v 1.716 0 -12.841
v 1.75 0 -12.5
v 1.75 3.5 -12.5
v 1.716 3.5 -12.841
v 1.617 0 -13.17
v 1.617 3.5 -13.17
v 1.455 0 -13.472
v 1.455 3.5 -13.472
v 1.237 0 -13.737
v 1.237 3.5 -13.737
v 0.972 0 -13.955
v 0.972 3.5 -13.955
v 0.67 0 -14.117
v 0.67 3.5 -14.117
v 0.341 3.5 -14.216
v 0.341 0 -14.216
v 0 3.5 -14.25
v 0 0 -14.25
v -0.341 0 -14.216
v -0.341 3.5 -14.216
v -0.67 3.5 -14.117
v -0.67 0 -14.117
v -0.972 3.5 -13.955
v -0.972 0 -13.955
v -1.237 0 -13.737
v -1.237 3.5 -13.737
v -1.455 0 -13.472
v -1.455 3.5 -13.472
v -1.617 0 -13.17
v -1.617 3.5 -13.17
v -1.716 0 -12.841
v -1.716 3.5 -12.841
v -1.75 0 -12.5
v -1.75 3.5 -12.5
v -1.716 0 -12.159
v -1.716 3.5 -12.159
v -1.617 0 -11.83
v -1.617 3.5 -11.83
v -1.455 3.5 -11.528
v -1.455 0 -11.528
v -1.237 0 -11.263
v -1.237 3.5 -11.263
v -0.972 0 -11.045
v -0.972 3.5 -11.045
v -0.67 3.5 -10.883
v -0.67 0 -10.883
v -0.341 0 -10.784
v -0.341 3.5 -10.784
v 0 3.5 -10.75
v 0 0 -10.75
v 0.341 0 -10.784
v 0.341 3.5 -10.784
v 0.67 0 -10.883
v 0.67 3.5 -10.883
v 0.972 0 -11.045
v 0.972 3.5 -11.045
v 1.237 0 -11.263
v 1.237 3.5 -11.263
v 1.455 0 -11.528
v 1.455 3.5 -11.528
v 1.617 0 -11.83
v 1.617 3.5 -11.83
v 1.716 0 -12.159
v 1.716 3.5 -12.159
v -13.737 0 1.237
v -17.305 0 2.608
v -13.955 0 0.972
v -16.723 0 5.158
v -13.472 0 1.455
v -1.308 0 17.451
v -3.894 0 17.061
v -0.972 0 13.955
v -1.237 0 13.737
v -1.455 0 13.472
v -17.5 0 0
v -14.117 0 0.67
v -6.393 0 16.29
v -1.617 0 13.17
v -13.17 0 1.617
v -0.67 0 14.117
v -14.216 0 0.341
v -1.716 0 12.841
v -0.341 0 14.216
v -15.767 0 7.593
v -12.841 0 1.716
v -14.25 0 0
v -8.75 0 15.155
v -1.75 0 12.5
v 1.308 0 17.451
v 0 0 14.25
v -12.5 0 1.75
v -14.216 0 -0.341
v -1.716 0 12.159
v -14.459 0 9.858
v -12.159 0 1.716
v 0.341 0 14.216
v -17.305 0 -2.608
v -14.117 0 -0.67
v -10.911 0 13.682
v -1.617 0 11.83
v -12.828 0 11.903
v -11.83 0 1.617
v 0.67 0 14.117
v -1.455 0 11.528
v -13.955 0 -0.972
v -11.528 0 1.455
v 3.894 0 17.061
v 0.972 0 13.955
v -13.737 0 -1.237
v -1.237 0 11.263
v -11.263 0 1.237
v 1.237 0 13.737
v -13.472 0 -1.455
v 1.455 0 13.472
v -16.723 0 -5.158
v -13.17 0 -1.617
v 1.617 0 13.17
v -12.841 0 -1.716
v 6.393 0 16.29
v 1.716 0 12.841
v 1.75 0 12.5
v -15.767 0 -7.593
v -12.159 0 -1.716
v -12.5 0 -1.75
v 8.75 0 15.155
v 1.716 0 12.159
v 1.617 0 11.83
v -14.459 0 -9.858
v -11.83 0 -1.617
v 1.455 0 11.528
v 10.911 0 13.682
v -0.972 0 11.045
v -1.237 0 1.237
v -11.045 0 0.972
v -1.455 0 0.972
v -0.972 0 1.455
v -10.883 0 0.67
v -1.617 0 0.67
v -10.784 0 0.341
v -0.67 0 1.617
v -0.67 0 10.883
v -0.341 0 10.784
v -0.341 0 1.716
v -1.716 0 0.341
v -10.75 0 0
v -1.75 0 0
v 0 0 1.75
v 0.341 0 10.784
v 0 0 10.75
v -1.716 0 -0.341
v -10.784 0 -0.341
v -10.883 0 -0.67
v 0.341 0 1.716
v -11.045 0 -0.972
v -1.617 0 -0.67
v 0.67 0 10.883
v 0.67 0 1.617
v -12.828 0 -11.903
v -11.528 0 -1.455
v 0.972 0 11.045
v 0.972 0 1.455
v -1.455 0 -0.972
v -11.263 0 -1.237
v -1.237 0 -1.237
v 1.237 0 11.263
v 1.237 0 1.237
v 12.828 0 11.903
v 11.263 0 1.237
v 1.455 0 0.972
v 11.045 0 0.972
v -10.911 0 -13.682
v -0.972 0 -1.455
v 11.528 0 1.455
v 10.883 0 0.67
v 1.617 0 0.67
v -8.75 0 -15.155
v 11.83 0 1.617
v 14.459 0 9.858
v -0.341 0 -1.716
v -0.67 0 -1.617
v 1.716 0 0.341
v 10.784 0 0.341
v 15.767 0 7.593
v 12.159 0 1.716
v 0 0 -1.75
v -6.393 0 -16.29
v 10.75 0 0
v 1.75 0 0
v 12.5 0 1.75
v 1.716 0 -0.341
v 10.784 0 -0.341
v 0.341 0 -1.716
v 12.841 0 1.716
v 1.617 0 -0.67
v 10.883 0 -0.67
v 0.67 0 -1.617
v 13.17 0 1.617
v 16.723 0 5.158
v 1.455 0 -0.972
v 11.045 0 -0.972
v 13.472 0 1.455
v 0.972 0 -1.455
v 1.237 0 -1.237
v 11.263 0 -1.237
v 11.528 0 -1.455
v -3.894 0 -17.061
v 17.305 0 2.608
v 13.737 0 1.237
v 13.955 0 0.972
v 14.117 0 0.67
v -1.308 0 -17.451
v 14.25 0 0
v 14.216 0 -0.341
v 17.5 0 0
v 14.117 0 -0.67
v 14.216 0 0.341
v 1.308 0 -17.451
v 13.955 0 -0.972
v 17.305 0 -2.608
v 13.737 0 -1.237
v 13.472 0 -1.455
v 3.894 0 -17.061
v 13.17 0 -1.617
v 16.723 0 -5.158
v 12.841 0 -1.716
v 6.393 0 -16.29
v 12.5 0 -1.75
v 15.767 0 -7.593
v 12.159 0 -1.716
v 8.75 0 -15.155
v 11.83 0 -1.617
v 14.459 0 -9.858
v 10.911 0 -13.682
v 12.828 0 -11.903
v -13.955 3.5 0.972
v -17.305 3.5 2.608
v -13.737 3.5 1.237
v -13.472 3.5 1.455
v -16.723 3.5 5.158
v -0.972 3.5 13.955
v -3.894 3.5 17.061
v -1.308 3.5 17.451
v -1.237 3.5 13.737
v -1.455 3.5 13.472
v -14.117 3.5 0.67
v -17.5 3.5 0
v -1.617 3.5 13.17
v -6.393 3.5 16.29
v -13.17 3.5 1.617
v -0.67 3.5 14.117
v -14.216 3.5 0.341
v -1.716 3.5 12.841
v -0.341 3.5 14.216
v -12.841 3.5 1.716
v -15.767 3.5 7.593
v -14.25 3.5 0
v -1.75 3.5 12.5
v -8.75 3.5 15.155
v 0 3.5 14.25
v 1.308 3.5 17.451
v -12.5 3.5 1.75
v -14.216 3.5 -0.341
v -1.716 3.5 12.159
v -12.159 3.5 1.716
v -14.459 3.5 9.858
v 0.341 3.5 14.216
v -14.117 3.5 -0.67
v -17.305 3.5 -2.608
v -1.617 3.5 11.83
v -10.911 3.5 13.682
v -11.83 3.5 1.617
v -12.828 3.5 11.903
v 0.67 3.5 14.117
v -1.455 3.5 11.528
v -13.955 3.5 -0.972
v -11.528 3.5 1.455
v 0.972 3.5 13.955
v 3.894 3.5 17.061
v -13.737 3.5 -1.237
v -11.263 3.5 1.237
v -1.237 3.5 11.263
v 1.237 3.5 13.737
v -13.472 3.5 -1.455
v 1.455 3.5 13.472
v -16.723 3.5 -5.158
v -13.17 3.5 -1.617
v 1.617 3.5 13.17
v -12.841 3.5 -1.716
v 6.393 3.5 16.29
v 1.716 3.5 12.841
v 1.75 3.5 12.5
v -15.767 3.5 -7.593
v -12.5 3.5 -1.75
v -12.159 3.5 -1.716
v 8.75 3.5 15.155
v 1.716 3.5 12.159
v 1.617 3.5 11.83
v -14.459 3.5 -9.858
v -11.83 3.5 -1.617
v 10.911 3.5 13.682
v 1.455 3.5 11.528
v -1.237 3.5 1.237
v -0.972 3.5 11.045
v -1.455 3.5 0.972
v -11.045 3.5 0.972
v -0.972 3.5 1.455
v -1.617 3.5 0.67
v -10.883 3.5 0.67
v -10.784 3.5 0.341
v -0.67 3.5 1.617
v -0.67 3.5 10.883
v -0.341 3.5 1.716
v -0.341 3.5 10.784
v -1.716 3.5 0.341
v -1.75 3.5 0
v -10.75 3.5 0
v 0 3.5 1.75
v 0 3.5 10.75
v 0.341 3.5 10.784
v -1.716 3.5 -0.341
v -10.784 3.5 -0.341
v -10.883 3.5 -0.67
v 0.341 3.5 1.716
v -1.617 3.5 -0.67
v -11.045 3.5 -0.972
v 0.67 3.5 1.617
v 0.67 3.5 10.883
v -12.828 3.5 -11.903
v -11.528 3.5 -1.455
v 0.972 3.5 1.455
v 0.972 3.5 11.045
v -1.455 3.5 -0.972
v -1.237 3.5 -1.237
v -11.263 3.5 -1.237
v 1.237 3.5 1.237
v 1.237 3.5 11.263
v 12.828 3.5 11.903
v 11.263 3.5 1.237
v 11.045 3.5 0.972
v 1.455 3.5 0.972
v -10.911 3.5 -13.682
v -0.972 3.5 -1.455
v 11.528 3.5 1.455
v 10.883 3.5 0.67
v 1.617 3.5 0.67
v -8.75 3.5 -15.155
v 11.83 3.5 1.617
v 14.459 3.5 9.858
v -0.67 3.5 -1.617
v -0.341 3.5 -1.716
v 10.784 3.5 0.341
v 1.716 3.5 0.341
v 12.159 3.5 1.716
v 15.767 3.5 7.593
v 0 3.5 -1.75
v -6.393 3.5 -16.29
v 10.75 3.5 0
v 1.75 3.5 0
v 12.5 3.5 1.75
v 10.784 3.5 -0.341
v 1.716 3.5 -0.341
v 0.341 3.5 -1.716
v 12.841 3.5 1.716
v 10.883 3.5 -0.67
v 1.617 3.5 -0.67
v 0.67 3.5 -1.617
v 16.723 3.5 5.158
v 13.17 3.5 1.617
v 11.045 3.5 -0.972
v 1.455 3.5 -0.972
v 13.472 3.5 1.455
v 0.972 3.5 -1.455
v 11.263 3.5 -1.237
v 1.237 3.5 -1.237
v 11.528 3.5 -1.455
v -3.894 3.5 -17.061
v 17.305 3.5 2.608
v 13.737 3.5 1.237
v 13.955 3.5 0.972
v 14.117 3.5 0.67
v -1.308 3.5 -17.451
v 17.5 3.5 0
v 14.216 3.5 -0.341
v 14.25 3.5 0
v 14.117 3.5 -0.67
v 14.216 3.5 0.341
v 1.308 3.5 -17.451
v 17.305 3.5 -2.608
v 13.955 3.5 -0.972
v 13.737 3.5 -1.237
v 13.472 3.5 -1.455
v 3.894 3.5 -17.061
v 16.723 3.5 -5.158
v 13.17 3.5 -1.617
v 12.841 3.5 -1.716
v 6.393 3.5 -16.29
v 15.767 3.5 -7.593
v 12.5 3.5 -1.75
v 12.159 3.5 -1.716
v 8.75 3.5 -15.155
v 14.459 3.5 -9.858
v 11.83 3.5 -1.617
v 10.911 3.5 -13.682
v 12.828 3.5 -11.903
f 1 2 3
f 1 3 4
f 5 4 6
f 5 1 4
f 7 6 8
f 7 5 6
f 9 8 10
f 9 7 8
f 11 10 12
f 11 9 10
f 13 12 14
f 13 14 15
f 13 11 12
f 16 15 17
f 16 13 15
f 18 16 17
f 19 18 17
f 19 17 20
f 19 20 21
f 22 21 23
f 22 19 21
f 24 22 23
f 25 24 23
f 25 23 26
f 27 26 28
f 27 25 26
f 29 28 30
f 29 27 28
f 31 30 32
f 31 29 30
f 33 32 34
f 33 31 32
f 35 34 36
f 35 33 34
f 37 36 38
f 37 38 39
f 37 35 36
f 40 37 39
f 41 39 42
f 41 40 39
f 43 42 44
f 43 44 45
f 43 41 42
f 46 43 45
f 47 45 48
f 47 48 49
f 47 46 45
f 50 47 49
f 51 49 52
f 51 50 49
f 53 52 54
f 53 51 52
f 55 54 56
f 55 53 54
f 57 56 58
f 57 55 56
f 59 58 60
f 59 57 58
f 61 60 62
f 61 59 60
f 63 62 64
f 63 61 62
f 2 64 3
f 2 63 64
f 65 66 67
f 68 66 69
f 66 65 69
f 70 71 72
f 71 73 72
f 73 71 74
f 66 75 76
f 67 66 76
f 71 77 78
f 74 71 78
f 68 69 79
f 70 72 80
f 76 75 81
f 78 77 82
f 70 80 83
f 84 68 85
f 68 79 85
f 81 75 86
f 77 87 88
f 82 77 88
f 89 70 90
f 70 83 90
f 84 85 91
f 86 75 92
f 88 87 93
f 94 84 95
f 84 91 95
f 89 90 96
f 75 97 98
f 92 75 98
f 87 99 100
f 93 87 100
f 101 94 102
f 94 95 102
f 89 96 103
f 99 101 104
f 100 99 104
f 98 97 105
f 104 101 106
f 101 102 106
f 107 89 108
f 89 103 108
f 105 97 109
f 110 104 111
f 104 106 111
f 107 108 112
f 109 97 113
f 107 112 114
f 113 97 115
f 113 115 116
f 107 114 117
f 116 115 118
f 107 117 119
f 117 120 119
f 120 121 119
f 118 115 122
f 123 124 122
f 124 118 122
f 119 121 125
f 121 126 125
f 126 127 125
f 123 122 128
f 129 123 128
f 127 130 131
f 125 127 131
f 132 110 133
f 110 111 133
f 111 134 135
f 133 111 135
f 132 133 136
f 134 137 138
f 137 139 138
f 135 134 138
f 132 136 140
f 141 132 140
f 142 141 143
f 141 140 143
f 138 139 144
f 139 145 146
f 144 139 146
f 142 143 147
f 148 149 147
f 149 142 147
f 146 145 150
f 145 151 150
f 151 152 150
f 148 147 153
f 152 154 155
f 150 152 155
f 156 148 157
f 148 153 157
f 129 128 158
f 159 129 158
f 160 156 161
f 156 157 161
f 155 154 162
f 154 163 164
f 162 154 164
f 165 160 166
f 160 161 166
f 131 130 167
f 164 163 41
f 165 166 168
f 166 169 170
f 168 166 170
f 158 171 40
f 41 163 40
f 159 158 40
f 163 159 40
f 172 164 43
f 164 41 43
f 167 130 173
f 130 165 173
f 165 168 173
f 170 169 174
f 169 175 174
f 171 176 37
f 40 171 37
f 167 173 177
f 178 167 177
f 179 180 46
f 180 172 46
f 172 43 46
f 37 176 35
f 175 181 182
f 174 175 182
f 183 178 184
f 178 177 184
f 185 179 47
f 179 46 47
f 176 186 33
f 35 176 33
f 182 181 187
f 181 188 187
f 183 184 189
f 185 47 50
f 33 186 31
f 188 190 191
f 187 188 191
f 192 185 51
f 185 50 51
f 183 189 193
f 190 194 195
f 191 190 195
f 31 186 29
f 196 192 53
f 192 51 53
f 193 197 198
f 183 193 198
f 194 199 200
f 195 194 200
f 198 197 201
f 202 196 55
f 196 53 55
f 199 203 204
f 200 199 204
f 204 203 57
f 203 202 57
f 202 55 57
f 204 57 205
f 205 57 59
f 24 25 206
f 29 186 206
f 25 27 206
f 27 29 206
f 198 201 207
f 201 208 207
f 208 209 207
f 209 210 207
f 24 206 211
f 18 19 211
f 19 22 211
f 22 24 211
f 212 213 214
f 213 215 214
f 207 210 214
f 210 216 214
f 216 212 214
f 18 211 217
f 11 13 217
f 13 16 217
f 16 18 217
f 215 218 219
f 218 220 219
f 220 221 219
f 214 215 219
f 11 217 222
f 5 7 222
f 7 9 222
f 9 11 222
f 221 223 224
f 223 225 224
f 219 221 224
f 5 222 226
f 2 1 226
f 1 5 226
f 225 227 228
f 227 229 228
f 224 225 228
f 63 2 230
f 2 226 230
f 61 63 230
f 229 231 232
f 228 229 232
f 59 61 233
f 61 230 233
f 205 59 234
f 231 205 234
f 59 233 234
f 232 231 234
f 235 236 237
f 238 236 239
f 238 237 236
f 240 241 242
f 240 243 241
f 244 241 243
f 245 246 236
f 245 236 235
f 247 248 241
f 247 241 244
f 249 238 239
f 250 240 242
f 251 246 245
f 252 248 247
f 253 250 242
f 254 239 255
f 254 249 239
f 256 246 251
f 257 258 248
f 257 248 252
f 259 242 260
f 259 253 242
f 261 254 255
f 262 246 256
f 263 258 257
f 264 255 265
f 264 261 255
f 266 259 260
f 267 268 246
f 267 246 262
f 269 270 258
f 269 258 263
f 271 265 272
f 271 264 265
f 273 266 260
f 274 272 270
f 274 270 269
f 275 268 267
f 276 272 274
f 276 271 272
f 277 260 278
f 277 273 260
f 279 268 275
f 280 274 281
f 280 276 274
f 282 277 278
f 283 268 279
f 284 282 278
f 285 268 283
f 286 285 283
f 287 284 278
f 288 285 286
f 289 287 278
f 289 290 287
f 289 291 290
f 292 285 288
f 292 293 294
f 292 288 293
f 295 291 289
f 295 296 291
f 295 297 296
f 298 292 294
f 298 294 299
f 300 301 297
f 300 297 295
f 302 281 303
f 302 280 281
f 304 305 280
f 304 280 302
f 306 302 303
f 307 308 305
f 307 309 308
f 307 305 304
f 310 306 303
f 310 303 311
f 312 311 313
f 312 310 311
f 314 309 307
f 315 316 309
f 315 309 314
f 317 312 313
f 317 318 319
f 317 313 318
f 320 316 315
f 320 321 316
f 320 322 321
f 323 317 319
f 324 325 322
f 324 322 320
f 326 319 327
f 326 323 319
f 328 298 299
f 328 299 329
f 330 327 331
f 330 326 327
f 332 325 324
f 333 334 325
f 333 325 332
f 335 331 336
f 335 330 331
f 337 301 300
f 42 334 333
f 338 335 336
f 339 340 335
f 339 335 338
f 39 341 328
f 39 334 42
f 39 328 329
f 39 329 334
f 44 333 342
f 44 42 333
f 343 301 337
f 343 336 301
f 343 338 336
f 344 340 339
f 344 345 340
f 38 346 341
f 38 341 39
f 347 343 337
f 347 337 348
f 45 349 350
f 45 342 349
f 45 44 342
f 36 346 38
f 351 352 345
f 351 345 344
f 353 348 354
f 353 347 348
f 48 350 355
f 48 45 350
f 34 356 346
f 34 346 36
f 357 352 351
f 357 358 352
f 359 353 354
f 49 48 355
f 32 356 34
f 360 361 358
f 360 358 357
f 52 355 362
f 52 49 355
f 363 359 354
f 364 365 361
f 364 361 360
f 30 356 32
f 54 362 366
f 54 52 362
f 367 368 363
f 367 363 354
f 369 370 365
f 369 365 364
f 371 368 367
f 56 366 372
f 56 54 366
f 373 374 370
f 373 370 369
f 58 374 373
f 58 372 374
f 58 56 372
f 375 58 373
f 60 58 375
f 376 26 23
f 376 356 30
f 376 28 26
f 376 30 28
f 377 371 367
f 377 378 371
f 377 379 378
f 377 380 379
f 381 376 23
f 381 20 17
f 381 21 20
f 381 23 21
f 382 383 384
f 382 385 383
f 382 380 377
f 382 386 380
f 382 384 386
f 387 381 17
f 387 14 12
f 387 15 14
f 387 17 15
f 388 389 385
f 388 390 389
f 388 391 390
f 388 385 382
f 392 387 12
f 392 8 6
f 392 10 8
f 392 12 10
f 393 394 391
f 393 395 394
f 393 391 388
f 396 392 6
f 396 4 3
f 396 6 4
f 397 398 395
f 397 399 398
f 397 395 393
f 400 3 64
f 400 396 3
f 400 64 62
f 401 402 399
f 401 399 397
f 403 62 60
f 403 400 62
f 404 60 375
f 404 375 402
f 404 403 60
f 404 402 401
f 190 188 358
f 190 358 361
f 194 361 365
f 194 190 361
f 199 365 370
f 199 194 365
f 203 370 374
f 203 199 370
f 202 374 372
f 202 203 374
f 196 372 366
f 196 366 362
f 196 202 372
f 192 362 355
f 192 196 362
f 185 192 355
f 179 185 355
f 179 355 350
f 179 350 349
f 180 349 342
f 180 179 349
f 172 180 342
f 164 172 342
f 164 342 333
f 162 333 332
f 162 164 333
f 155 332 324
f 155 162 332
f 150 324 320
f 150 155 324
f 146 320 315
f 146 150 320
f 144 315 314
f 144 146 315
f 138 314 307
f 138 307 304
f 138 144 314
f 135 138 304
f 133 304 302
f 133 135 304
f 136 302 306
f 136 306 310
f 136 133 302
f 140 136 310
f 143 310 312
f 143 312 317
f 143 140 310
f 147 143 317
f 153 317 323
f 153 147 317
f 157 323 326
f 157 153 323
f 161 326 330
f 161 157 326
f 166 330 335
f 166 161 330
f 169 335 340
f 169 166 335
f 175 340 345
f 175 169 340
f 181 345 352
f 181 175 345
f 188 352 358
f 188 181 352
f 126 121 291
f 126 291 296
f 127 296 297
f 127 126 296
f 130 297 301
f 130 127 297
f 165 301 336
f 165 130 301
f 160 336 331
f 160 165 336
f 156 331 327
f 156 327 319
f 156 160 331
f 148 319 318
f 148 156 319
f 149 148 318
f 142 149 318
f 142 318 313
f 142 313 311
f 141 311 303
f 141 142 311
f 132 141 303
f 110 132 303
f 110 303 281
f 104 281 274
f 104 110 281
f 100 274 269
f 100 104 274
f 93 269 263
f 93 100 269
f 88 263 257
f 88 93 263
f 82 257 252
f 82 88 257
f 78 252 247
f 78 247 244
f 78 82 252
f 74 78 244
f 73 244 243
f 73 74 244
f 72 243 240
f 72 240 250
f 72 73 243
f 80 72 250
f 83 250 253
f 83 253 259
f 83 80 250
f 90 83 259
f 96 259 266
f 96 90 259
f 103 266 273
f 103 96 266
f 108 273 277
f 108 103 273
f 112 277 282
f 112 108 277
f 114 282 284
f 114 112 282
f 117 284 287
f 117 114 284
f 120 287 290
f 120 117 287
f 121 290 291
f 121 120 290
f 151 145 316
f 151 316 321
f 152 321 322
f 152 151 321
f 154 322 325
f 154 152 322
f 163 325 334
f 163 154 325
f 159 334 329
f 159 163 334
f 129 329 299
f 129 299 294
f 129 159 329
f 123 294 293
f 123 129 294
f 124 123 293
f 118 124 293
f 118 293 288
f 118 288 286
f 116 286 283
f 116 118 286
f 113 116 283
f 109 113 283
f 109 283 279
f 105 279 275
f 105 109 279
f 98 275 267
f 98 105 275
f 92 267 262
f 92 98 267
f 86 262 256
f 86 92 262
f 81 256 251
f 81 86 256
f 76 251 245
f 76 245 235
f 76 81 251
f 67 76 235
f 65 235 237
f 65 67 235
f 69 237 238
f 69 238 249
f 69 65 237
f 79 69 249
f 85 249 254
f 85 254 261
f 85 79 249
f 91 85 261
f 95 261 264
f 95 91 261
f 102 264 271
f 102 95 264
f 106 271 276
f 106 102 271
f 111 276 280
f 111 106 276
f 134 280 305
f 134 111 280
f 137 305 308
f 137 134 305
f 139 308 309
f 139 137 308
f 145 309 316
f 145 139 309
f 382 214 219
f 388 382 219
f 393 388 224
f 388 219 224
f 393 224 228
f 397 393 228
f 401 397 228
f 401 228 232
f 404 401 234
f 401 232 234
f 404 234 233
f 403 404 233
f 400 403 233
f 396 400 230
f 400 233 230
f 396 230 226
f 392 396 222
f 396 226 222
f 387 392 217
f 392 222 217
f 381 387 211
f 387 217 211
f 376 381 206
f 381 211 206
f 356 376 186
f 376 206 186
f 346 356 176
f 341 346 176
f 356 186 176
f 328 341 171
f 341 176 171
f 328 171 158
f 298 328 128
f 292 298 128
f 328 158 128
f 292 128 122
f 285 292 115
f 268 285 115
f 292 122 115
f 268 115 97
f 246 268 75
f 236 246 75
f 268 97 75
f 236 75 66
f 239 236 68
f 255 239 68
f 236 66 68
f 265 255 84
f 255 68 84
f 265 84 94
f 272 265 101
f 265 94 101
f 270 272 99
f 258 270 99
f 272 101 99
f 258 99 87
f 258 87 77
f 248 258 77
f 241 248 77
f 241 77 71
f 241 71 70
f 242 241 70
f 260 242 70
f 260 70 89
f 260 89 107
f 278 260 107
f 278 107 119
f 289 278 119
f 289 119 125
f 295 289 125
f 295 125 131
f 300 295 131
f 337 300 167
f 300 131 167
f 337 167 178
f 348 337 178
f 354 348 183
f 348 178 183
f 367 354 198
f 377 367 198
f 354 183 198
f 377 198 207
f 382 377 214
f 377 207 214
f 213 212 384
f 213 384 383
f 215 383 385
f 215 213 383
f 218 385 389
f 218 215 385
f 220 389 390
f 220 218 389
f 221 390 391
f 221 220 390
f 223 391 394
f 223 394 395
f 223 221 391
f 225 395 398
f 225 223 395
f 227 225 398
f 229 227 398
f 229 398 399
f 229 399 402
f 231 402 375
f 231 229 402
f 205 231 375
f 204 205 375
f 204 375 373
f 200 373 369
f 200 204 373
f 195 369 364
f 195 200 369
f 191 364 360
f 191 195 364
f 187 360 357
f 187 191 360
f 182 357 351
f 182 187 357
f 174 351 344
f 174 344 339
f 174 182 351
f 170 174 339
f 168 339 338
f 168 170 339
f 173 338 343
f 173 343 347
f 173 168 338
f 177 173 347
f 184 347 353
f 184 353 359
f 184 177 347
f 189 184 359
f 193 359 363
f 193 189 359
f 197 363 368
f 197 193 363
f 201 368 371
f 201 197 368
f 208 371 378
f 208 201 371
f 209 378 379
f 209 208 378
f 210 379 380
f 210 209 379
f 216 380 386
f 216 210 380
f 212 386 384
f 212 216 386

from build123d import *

# Parameters (mm, degrees)
SKETCH1_R           = 17.5
BOSS_EXTRUDE1_DEPTH = 3.5
SKETCH1_3_R         = 1.75
CUT_EXTRUDE1_DEPTH  = 3.5


with BuildPart() as part:
    # Sketch1 → Boss-Extrude1 (new body)
    with BuildSketch(Plane(origin=(0, 0, 0), x_dir=(1, 0, 0), z_dir=(0, 1, 0))):
        Circle(SKETCH1_R)
    extrude(amount=BOSS_EXTRUDE1_DEPTH)

    # Sketch1<3> → Cut-Extrude1 (cut)
    with BuildSketch(Plane(origin=(0, 0, 0), x_dir=(1, 0, 0), z_dir=(0, 1, 0))):
        Circle(SKETCH1_3_R)
        with Locations((0, 12.5)):
            Circle(SKETCH1_3_R)
        with Locations((-12.5, 0)):
            Circle(SKETCH1_3_R)
        with Locations((0, -12.5)):
            Circle(SKETCH1_3_R)
        with Locations((12.5, 0)):
            Circle(SKETCH1_3_R)
    extrude(amount=CUT_EXTRUDE1_DEPTH, mode=Mode.SUBTRACT)


solid = part.part
